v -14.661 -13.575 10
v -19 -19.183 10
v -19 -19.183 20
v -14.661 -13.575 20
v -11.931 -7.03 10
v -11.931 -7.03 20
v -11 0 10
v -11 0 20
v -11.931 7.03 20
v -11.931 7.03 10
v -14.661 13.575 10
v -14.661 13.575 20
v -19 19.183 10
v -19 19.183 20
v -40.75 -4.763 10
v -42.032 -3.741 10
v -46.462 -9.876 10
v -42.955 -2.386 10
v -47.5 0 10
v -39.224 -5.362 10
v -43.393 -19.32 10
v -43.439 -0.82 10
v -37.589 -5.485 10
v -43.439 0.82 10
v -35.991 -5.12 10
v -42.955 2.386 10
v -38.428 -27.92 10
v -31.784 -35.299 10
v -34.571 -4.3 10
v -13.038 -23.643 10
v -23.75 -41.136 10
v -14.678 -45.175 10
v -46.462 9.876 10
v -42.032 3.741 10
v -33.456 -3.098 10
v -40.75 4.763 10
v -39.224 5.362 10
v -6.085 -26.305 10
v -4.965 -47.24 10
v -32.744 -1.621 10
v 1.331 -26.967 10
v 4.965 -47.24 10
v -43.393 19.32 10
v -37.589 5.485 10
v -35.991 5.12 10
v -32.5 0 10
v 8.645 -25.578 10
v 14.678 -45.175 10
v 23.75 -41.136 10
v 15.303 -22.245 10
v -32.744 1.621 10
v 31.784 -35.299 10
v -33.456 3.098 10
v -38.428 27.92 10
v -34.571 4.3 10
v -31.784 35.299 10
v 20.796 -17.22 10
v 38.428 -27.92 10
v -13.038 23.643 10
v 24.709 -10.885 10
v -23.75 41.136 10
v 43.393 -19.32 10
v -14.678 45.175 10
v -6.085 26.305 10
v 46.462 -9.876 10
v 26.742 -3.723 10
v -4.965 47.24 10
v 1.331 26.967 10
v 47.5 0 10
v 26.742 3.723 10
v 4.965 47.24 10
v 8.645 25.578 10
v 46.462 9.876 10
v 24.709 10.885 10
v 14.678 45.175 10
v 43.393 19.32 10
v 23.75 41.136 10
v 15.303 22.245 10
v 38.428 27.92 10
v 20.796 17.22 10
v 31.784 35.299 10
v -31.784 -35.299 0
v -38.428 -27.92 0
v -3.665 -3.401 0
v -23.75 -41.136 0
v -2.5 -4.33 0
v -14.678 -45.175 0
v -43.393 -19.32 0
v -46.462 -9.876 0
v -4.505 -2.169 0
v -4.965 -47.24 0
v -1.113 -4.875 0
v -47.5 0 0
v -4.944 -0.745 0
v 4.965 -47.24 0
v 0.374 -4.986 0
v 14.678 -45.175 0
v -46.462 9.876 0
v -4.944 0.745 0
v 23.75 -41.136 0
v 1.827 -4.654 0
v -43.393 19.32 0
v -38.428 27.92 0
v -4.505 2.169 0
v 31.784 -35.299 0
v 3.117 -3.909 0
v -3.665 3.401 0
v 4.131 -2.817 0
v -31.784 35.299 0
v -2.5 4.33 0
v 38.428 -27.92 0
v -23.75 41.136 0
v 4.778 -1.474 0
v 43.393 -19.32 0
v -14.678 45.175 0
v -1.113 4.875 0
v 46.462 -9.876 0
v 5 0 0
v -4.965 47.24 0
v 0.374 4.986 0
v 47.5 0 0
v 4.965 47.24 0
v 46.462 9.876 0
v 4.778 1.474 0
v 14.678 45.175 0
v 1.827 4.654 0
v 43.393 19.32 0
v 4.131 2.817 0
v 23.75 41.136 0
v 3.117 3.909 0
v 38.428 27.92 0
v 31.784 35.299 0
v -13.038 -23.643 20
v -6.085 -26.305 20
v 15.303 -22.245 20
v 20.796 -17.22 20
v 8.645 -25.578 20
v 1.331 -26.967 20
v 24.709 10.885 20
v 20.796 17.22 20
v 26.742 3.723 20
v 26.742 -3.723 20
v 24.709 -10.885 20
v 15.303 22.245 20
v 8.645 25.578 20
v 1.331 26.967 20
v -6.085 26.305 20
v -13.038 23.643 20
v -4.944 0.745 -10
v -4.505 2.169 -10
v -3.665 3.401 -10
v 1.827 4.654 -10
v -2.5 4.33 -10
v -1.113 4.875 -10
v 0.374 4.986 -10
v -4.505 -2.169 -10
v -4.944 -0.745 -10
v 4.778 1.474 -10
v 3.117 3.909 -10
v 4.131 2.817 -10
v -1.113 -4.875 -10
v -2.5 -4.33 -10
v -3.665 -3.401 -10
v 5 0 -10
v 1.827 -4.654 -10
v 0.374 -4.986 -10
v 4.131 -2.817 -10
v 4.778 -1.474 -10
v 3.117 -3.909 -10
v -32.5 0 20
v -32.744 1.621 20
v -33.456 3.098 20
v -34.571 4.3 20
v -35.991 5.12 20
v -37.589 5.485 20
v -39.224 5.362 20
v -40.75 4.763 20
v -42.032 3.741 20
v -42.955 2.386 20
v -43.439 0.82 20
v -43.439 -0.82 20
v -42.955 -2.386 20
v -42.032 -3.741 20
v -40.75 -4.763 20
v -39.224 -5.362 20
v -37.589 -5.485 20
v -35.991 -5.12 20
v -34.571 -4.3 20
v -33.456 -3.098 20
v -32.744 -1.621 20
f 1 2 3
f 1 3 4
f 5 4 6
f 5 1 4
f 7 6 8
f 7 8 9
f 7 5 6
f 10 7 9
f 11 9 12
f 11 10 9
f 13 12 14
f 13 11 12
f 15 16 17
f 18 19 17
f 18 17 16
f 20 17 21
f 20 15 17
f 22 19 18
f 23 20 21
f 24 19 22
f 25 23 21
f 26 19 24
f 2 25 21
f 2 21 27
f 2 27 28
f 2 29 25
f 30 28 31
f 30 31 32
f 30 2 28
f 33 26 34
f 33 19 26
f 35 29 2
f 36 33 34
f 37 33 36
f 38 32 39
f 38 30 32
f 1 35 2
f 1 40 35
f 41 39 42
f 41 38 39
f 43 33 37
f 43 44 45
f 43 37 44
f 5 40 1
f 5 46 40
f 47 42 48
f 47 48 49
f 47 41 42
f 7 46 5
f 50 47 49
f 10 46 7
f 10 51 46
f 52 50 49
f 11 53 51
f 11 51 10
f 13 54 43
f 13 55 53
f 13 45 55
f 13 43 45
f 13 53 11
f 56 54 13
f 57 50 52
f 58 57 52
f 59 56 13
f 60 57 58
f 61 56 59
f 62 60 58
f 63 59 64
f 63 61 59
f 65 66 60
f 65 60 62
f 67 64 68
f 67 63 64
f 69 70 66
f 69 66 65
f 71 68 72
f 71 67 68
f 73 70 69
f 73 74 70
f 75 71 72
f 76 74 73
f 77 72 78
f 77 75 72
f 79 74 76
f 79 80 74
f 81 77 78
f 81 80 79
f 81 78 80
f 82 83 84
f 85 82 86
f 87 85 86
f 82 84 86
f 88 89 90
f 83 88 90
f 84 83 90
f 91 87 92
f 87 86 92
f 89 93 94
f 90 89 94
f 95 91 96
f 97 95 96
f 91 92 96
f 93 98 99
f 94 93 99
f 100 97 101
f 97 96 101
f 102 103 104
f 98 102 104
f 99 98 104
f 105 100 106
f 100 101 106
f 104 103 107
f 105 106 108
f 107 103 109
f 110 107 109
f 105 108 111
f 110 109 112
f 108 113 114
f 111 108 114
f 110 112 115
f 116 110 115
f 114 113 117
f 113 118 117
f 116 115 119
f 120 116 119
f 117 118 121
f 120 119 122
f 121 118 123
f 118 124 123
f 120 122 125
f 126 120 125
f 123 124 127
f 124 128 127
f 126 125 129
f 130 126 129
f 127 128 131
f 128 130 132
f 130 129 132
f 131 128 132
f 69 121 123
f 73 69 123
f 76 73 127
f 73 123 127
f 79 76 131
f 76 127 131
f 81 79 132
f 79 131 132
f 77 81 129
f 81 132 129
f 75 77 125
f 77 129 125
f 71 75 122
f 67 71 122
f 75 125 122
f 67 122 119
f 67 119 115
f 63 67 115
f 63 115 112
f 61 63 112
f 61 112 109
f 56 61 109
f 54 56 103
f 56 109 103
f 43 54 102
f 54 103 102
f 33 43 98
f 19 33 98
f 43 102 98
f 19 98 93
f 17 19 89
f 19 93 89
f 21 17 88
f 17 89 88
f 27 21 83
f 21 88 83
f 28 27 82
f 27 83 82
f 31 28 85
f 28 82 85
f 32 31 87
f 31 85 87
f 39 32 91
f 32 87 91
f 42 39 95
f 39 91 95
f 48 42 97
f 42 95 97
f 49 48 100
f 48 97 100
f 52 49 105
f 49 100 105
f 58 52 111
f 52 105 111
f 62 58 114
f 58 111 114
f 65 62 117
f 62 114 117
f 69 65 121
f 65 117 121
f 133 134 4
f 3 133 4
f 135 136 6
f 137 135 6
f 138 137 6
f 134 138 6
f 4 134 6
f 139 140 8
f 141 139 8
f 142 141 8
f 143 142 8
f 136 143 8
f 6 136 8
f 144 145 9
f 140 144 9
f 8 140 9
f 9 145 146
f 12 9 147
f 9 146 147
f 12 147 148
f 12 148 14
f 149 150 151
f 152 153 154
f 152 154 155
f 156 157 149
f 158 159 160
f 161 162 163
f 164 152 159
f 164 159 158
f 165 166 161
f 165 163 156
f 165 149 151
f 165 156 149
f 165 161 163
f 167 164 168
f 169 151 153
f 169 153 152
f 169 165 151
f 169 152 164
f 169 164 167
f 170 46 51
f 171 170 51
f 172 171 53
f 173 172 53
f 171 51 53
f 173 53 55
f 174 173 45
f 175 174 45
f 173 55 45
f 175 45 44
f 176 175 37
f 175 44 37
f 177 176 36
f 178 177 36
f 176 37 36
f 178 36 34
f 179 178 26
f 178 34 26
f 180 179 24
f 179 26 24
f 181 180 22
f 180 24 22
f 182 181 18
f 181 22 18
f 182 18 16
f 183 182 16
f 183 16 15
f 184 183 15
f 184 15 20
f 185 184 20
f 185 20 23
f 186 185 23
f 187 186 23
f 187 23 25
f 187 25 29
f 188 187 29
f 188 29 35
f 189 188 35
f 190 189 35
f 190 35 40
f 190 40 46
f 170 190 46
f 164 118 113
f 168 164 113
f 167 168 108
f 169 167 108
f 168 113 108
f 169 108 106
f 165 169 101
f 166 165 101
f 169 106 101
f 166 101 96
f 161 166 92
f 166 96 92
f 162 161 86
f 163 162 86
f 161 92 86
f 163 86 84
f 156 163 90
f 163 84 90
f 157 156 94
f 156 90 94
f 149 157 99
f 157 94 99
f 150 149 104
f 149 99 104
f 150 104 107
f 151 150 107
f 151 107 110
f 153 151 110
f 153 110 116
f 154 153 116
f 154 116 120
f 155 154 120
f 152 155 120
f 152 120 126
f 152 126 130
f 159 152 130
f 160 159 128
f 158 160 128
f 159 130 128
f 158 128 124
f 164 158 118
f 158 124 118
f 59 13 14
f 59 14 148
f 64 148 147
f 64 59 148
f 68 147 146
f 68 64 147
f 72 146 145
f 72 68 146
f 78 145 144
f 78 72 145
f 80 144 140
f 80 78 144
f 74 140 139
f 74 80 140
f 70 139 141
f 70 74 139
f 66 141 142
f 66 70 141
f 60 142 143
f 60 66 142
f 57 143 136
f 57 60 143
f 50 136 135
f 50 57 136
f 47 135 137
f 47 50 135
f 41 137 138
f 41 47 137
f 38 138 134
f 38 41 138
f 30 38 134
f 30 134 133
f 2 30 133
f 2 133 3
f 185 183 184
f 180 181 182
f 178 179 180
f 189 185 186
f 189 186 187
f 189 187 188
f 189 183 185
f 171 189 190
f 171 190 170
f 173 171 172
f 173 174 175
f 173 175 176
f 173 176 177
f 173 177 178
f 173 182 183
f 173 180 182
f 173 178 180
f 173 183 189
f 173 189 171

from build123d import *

# Parameters (mm, degrees)
CROQUIS2_R              = 47.5
CROQUIS2_R_2            = 5.5
SALIENTE_EXTRUIR1_DEPTH = 10
CROQUIS2_4_R            = 5.5
SALIENTE_EXTRUIR2_DEPTH = 20
CROQUIS6_R              = 5
SALIENTE_EXTRUIR3_DEPTH = 10


with BuildPart() as part:
    # Croquis2 → Saliente-Extruir1 (new body)
    with BuildSketch(Plane.XY):
        Circle(CROQUIS2_R)
        with Locations((-38, 0)):
            Circle(CROQUIS2_R_2, mode=Mode.SUBTRACT)
        with BuildLine():
            ThreePointArc((-19, 19.183326093), (27, 0), (-19, -19.183326093))
            ThreePointArc((-19, -19.183326093), (-11, 0), (-19, 19.183326093))
        make_face(mode=Mode.SUBTRACT)
    extrude(amount=SALIENTE_EXTRUIR1_DEPTH)

    # Croquis2<4> → Saliente-Extruir2 (add)
    with BuildSketch(Plane.XY):
        with BuildLine():
            ThreePointArc((-19, 19.183326093), (-11, 0), (-19, -19.183326093))
            ThreePointArc((-19, -19.183326093), (27, 0), (-19, 19.183326093))
        make_face()
        with Locations((-38, 0)):
            Circle(CROQUIS2_4_R)
    extrude(amount=SALIENTE_EXTRUIR2_DEPTH)

    # Croquis6 → Saliente-Extruir3 (add)
    with BuildSketch(Plane(origin=(0, 0, 0), x_dir=(-1, 0, 0), z_dir=(0, 0, -1))):
        Circle(CROQUIS6_R)
    extrude(amount=SALIENTE_EXTRUIR3_DEPTH)


solid = part.part
